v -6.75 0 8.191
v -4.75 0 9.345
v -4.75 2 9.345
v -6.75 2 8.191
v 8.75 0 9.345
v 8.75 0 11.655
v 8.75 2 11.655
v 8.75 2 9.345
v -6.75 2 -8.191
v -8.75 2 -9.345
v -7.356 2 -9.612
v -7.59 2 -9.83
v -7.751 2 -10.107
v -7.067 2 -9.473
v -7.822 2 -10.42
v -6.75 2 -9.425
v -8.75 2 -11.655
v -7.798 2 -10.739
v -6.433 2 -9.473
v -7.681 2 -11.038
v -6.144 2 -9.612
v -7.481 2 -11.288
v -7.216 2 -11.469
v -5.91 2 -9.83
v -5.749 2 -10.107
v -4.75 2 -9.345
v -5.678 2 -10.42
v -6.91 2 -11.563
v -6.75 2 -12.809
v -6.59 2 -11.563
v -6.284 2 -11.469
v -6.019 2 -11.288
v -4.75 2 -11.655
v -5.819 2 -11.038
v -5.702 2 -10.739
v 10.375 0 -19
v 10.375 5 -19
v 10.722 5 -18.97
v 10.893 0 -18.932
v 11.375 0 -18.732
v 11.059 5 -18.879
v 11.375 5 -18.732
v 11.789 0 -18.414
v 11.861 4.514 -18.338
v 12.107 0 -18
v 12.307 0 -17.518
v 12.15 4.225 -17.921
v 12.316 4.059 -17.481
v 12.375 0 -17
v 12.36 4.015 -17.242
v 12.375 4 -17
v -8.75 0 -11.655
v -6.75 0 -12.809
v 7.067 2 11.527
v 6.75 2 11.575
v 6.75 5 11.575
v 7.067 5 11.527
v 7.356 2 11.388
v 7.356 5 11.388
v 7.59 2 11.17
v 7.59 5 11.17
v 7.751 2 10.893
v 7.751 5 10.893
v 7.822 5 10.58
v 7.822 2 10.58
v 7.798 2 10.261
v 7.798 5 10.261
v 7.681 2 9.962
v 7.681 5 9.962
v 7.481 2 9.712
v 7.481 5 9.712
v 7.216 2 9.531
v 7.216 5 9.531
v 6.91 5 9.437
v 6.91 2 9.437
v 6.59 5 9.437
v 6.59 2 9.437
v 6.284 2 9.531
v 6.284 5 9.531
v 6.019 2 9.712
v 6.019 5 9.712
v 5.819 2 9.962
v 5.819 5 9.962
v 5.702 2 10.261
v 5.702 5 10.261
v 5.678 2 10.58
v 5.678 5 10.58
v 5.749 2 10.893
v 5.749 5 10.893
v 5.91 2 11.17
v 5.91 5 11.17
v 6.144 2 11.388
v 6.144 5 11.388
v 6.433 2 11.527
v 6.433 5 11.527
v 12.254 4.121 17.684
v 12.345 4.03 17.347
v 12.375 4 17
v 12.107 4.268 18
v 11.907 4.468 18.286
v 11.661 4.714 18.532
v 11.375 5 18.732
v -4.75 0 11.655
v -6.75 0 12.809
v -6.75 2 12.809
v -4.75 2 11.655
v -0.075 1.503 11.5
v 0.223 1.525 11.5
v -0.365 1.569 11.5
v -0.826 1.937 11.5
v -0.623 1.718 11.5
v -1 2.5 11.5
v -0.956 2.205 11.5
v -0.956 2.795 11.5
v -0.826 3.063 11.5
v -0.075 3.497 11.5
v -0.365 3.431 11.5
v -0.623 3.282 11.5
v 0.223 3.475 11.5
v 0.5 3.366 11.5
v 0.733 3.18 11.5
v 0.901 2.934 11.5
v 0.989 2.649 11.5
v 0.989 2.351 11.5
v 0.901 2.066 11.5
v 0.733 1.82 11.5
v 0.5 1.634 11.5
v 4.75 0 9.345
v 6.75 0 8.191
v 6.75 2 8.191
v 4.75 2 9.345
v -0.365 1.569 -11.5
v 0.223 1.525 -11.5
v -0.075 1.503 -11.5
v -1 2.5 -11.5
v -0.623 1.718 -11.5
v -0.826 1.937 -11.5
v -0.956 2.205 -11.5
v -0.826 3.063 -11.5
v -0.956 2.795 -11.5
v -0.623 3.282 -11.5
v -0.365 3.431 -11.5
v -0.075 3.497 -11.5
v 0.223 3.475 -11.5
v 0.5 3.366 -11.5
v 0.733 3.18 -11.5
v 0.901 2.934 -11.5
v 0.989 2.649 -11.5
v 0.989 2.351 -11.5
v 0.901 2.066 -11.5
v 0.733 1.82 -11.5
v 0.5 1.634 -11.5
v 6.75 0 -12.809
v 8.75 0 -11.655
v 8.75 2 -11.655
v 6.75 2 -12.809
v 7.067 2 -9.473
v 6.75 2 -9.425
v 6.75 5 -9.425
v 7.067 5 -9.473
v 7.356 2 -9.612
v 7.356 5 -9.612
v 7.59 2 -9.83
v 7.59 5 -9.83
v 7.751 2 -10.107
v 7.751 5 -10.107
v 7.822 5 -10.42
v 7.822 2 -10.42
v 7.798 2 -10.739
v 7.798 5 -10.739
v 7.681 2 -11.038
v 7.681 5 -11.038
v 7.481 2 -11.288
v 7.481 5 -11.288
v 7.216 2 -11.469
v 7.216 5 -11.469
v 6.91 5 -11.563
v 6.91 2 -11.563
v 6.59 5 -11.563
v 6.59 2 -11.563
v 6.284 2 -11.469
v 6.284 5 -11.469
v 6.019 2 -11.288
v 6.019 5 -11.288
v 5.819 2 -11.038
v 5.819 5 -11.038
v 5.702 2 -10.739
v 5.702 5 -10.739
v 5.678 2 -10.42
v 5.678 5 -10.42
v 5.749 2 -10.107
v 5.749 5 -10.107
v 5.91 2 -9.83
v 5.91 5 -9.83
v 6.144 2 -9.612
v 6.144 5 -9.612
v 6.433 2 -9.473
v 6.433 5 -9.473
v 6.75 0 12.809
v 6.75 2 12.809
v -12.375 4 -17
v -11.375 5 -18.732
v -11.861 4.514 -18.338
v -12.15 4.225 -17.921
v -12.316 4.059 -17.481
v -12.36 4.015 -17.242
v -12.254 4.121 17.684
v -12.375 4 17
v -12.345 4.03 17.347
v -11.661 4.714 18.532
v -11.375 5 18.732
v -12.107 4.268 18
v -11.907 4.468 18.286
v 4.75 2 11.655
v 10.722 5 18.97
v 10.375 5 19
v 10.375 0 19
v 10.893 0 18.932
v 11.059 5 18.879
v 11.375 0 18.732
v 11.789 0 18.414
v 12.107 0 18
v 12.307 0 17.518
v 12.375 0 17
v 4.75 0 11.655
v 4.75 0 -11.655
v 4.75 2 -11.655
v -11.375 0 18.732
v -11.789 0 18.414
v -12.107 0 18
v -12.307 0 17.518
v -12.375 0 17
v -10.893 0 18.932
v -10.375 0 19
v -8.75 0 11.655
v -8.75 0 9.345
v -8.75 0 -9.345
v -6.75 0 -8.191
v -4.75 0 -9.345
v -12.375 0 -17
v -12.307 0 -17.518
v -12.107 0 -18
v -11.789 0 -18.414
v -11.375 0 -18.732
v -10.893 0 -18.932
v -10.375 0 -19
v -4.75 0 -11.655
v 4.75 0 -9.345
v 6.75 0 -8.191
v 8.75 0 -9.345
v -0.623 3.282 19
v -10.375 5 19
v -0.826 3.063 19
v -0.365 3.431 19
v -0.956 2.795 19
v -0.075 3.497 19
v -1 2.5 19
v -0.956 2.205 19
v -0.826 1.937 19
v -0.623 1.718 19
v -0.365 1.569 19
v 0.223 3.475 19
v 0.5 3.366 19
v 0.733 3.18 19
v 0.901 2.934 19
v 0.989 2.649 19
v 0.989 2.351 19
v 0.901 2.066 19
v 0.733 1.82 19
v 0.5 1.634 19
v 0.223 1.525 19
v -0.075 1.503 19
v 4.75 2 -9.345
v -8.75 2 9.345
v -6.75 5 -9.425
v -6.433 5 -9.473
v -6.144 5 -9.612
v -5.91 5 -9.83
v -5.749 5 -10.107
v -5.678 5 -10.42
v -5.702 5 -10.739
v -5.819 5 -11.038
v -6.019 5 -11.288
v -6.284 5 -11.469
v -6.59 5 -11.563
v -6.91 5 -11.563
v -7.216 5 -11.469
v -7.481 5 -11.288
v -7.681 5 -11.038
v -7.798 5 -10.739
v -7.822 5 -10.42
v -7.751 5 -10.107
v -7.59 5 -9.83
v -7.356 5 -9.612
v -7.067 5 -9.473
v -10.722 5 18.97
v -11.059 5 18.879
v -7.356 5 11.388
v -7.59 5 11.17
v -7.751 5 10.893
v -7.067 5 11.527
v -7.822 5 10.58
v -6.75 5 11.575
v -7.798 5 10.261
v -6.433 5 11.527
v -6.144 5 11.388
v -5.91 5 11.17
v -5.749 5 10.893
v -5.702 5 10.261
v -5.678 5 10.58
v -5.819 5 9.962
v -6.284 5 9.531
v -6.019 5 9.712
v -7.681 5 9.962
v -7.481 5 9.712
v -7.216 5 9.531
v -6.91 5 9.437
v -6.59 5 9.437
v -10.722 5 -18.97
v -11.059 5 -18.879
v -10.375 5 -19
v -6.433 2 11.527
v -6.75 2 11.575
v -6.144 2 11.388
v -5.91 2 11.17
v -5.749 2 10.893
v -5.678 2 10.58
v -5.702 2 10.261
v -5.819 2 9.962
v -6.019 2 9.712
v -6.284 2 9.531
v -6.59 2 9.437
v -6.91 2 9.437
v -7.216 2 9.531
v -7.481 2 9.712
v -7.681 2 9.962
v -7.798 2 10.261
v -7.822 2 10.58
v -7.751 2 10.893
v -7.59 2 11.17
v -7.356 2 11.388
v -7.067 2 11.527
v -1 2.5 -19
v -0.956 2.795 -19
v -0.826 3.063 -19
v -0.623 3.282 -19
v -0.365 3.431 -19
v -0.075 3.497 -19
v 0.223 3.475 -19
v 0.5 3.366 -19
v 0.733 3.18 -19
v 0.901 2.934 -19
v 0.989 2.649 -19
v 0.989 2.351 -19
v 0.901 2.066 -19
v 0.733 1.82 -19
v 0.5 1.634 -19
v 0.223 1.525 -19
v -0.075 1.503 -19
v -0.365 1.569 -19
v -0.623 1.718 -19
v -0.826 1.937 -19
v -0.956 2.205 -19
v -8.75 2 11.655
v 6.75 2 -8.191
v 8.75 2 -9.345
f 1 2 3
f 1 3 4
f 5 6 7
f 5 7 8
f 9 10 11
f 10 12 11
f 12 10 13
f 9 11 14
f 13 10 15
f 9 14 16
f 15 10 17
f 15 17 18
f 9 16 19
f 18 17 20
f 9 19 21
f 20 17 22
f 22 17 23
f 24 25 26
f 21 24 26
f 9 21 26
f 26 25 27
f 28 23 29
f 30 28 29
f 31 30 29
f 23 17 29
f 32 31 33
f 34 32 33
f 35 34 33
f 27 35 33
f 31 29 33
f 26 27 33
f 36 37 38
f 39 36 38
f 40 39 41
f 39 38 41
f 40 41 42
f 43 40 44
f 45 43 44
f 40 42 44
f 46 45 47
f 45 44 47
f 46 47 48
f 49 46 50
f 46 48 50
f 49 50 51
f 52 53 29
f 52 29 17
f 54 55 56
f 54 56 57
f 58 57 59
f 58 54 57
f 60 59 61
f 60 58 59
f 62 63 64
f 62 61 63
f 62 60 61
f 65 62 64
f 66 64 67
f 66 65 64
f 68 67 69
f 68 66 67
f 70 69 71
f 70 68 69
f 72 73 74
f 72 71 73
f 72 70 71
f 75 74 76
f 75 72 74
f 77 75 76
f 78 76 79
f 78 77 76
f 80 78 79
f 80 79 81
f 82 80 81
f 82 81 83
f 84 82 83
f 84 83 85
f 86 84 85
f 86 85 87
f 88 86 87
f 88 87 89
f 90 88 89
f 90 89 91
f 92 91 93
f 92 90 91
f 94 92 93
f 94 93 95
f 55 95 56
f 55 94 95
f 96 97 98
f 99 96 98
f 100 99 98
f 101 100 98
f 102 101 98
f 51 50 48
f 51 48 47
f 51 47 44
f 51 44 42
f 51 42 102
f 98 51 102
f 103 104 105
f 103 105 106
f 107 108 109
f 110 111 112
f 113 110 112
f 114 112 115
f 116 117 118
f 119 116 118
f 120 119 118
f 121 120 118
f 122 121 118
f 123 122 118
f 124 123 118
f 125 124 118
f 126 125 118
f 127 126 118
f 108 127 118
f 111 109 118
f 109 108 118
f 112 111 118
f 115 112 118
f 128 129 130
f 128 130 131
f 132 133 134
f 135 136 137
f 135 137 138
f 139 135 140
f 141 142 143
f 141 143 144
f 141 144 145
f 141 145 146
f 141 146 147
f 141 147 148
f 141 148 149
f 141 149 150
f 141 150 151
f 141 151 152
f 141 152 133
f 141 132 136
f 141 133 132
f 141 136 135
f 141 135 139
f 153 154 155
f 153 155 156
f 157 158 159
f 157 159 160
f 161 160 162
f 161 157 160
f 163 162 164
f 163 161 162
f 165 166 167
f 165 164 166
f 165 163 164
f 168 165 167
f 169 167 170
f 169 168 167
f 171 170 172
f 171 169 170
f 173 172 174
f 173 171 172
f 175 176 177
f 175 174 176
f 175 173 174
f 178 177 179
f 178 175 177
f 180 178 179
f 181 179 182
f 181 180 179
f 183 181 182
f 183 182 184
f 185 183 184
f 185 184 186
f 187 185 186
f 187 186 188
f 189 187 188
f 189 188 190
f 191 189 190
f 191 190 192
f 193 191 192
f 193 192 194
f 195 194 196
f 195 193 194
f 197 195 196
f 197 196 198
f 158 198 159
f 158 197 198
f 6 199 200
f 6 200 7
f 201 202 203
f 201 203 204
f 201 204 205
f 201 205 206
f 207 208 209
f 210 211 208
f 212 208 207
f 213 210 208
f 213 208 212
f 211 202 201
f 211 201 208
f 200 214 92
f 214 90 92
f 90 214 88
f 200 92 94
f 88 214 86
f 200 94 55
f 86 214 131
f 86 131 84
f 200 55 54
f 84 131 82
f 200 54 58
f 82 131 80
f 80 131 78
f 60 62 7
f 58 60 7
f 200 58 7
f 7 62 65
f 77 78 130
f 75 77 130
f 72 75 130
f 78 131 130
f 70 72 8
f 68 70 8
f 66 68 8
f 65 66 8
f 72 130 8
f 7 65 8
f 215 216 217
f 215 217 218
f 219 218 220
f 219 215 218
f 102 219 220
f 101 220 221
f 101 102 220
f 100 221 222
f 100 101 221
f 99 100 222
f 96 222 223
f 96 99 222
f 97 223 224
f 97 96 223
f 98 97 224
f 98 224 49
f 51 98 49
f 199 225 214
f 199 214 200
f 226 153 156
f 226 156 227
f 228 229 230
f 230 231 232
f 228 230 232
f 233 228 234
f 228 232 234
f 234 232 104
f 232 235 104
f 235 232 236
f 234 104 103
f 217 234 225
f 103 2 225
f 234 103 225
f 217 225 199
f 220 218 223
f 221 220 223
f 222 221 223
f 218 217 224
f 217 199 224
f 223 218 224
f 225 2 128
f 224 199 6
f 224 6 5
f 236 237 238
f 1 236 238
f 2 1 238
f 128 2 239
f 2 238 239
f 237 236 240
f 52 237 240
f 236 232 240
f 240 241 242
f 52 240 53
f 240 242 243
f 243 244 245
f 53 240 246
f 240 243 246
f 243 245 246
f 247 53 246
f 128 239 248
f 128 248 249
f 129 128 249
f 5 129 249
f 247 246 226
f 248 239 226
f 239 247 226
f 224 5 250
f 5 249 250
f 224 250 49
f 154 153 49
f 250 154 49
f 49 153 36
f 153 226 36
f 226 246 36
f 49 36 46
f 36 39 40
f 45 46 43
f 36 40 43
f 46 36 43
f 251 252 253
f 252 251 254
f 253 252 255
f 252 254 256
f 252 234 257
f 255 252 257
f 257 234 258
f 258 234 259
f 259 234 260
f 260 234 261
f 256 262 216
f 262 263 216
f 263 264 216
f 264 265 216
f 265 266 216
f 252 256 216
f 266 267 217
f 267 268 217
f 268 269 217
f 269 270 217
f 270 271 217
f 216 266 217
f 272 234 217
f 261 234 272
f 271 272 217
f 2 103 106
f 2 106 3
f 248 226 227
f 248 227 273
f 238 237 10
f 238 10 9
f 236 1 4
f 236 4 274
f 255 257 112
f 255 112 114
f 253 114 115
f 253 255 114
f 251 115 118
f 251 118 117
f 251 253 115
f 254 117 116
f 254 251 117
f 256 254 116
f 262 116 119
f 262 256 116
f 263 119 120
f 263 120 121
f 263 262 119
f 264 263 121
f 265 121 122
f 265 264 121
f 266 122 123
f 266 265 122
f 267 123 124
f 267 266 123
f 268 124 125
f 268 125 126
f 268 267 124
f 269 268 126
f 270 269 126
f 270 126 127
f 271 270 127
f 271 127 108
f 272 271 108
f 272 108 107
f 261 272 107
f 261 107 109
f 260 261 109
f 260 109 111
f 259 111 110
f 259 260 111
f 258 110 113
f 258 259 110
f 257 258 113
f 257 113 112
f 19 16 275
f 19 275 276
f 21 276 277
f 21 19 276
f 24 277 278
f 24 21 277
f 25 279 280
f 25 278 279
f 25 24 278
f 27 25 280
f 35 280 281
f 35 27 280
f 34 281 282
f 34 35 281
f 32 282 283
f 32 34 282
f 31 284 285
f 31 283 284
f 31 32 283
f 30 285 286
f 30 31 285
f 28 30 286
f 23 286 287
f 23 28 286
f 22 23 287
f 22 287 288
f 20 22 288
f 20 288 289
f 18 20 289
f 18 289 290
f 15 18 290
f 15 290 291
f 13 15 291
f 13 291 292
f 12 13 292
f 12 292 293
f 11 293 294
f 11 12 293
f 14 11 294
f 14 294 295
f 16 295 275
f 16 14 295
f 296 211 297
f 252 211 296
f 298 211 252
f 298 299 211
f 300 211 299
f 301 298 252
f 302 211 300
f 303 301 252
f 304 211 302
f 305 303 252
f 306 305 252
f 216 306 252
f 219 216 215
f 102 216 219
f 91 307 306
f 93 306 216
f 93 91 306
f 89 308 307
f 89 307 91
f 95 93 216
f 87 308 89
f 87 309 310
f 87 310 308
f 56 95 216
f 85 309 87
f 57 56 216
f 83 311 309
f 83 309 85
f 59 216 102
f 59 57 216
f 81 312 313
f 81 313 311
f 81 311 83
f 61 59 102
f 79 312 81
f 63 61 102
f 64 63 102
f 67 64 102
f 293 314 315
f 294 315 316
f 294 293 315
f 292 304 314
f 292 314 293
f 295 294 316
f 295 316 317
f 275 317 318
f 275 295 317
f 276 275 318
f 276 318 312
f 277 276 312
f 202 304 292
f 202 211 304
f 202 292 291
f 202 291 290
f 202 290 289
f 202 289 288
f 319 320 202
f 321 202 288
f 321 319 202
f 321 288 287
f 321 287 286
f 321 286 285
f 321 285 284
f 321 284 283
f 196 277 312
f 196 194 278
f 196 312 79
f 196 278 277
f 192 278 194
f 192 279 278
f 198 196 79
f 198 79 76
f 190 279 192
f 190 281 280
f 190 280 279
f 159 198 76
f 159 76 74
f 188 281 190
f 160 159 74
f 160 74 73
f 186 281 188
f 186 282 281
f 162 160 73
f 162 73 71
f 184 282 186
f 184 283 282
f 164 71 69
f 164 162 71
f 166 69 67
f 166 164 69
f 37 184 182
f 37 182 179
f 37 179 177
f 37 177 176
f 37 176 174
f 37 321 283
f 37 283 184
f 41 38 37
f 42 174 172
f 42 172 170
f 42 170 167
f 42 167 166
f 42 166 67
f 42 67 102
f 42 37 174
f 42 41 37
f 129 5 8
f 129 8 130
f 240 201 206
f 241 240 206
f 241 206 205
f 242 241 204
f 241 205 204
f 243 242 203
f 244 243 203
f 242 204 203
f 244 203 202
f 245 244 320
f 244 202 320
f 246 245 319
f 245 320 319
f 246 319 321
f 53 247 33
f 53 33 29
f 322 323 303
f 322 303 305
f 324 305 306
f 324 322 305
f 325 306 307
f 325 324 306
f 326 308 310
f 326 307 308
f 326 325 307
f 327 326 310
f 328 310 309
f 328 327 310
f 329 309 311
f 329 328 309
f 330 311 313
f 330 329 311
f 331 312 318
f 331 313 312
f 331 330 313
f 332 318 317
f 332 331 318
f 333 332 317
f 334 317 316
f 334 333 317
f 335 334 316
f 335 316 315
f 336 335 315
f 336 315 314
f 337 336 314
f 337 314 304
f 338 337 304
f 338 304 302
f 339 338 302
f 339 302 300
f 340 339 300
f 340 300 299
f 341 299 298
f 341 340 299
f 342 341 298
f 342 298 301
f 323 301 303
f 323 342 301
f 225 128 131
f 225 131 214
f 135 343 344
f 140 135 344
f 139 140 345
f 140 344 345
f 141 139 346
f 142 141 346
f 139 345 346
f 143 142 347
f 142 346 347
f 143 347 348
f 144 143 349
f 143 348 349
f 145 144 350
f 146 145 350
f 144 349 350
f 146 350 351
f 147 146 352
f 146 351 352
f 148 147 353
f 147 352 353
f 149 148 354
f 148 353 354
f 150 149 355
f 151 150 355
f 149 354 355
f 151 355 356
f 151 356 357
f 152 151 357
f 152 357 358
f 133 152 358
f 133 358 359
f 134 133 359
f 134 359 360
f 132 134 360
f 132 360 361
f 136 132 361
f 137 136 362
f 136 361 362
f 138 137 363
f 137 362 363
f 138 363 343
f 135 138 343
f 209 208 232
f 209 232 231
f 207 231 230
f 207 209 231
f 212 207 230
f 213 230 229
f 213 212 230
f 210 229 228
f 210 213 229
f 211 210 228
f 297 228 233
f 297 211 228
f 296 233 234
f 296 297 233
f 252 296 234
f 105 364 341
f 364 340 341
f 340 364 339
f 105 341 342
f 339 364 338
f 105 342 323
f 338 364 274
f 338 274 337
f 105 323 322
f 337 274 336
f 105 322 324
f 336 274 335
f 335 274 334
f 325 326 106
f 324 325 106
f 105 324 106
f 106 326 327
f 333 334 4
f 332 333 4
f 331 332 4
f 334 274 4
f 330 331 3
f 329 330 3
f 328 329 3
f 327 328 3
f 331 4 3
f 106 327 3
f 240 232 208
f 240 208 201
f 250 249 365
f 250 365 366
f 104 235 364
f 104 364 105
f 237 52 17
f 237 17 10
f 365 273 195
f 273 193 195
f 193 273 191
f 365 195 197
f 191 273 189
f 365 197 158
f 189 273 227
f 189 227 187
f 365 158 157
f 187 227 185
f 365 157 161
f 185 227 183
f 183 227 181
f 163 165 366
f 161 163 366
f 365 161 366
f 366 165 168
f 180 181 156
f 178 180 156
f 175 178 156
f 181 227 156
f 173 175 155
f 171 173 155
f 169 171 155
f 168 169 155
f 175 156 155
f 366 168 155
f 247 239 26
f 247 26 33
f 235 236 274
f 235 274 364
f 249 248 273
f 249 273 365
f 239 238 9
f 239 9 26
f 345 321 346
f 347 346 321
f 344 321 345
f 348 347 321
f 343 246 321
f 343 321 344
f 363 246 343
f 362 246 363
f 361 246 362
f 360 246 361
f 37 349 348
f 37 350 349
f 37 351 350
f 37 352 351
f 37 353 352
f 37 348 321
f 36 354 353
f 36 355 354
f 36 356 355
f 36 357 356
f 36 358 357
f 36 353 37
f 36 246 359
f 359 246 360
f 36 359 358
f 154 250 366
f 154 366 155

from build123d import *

# Parameters (mm, degrees)
BASE_W              = 24.75
BASE_H              = 38
BASE_R              = 1.075
BOSS_EXTRUDE1_DEPTH = 5
SKETCH1_3_R         = 1.075
CUT_EXTRUDE1_DEPTH  = 2
SKETCH1_5_R         = 1.075
CUT_EXTRUDE2_DEPTH  = 24.219401909
FILLET1_R           = 2
CHAMFER1_SIZE       = 1
MOUNT_HOLE_R        = 1
CUT_EXTRUDE3_DEPTH  = 7.5


with BuildPart() as part:
    # Base → Boss-Extrude1 (new body)
    # profile 1 of 9: a face of its own
    with BuildSketch(Plane(origin=(0, 0, 0), x_dir=(1, 0, 0), z_dir=(0, 1, 0))):
        Rectangle(BASE_W, BASE_H)
        Polygon((-6.75, -12.809401077), (-4.75, -11.654700538), (-4.75, -9.345299462), (-6.75, -8.190598923), (-8.75, -9.345299462), (-8.75, -11.654700538), align=None, mode=Mode.SUBTRACT)
        Polygon((6.75, -12.809401077), (8.75, -11.654700538), (8.75, -9.345299462), (6.75, -8.190598923), (4.75, -9.345299462), (4.75, -11.654700538), align=None, mode=Mode.SUBTRACT)
        Polygon((8.75, 9.345299462), (8.75, 11.654700538), (6.75, 12.809401077), (4.75, 11.654700538), (4.75, 9.345299462), (6.75, 8.190598923), align=None, mode=Mode.SUBTRACT)
        Polygon((-6.75, 8.190598923), (-4.75, 9.345299462), (-4.75, 11.654700538), (-6.75, 12.809401077), (-8.75, 11.654700538), (-8.75, 9.345299462), align=None, mode=Mode.SUBTRACT)
    # profile 2 of 9: a face of its own
    with BuildSketch(Plane(origin=(0, 0, 0), x_dir=(1, 0, 0), z_dir=(0, 1, 0))):
        Polygon((4.75, -11.654700538), (6.75, -12.809401077), (8.75, -11.654700538), (8.75, -9.345299462), (6.75, -8.190598923), (4.75, -9.345299462), align=None)
        with Locations((6.75, -10.5)):
            Circle(BASE_R, mode=Mode.SUBTRACT)
    # profile 3 of 9: a face of its own
    with BuildSketch(Plane(origin=(0, 0, 0), x_dir=(1, 0, 0), z_dir=(0, 1, 0))):
        with Locations((6.75, -10.5)):
            Circle(BASE_R)
    # profile 4 of 9: a face of its own
    with BuildSketch(Plane(origin=(0, 0, 0), x_dir=(1, 0, 0), z_dir=(0, 1, 0))):
        Polygon((6.75, 8.190598923), (8.75, 9.345299462), (8.75, 11.654700538), (6.75, 12.809401077), (4.75, 11.654700538), (4.75, 9.345299462), align=None)
        with Locations((6.75, 10.5)):
            Circle(BASE_R, mode=Mode.SUBTRACT)
    # profile 5 of 9: a face of its own
    with BuildSketch(Plane(origin=(0, 0, 0), x_dir=(1, 0, 0), z_dir=(0, 1, 0))):
        Polygon((-8.75, 9.345299462), (-6.75, 8.190598923), (-4.75, 9.345299462), (-4.75, 11.654700538), (-6.75, 12.809401077), (-8.75, 11.654700538), align=None)
        with Locations((-6.75, 10.5)):
            Circle(BASE_R, mode=Mode.SUBTRACT)
    # profile 6 of 9: a face of its own
    with BuildSketch(Plane(origin=(0, 0, 0), x_dir=(1, 0, 0), z_dir=(0, 1, 0))):
        with Locations((-6.75, 10.5)):
            Circle(BASE_R)
    # profile 7 of 9: a face of its own
    with BuildSketch(Plane(origin=(0, 0, 0), x_dir=(1, 0, 0), z_dir=(0, 1, 0))):
        with Locations((6.75, 10.5)):
            Circle(BASE_R)
    # profile 8 of 9: a face of its own
    with BuildSketch(Plane(origin=(0, 0, 0), x_dir=(1, 0, 0), z_dir=(0, 1, 0))):
        Polygon((-8.75, -11.654700538), (-6.75, -12.809401077), (-4.75, -11.654700538), (-4.75, -9.345299462), (-6.75, -8.190598923), (-8.75, -9.345299462), align=None)
        with Locations((-6.75, -10.5)):
            Circle(BASE_R, mode=Mode.SUBTRACT)
    # profile 9 of 9: a face of its own
    with BuildSketch(Plane(origin=(0, 0, 0), x_dir=(1, 0, 0), z_dir=(0, 1, 0))):
        with Locations((-6.75, -10.5)):
            Circle(BASE_R)
    extrude(amount=BOSS_EXTRUDE1_DEPTH)

    # Sketch1<3> → Cut-Extrude1 (cut)
    # profile 1 of 8: a face of its own
    with BuildSketch(Plane(origin=(0, 0, 0), x_dir=(1, 0, 0), z_dir=(0, 1, 0))):
        Polygon((-8.75, 9.345299462), (-6.75, 8.190598923), (-4.75, 9.345299462), (-4.75, 11.654700538), (-6.75, 12.809401077), (-8.75, 11.654700538), align=None)
        with Locations((-6.75, 10.5)):
            Circle(SKETCH1_3_R, mode=Mode.SUBTRACT)
    # profile 2 of 8: a face of its own
    with BuildSketch(Plane(origin=(0, 0, 0), x_dir=(1, 0, 0), z_dir=(0, 1, 0))):
        with Locations((-6.75, 10.5)):
            Circle(SKETCH1_3_R)
    # profile 3 of 8: a face of its own
    with BuildSketch(Plane(origin=(0, 0, 0), x_dir=(1, 0, 0), z_dir=(0, 1, 0))):
        Polygon((-8.75, -11.654700538), (-6.75, -12.809401077), (-4.75, -11.654700538), (-4.75, -9.345299462), (-6.75, -8.190598923), (-8.75, -9.345299462), align=None)
        with Locations((-6.75, -10.5)):
            Circle(SKETCH1_3_R, mode=Mode.SUBTRACT)
    # profile 4 of 8: a face of its own
    with BuildSketch(Plane(origin=(0, 0, 0), x_dir=(1, 0, 0), z_dir=(0, 1, 0))):
        with Locations((-6.75, -10.5)):
            Circle(SKETCH1_3_R)
    # profile 5 of 8: a face of its own
    with BuildSketch(Plane(origin=(0, 0, 0), x_dir=(1, 0, 0), z_dir=(0, 1, 0))):
        Polygon((4.75, -11.654700538), (6.75, -12.809401077), (8.75, -11.654700538), (8.75, -9.345299462), (6.75, -8.190598923), (4.75, -9.345299462), align=None)
        with Locations((6.75, -10.5)):
            Circle(SKETCH1_3_R, mode=Mode.SUBTRACT)
    # profile 6 of 8: a face of its own
    with BuildSketch(Plane(origin=(0, 0, 0), x_dir=(1, 0, 0), z_dir=(0, 1, 0))):
        with Locations((6.75, -10.5)):
            Circle(SKETCH1_3_R)
    # profile 7 of 8: a face of its own
    with BuildSketch(Plane(origin=(0, 0, 0), x_dir=(1, 0, 0), z_dir=(0, 1, 0))):
        Polygon((6.75, 8.190598923), (8.75, 9.345299462), (8.75, 11.654700538), (6.75, 12.809401077), (4.75, 11.654700538), (4.75, 9.345299462), align=None)
        with Locations((6.75, 10.5)):
            Circle(SKETCH1_3_R, mode=Mode.SUBTRACT)
    # profile 8 of 8: a face of its own
    with BuildSketch(Plane(origin=(0, 0, 0), x_dir=(1, 0, 0), z_dir=(0, 1, 0))):
        with Locations((6.75, 10.5)):
            Circle(SKETCH1_3_R)
    extrude(amount=CUT_EXTRUDE1_DEPTH, mode=Mode.SUBTRACT)

    # Sketch1<5> → Cut-Extrude2 (cut, through all)
    with BuildSketch(Plane(origin=(0, 0, 0), x_dir=(1, 0, 0), z_dir=(0, 1, 0))):
        with Locations(Location((6.75, 10.5, 0), (0, 0, 270))):
            Circle(SKETCH1_5_R)
        with Locations(Location((6.75, -10.5, 0), (0, 0, 270))):
            Circle(SKETCH1_5_R)
        with Locations(Location((-6.75, -10.5, 0), (0, 0, 270))):
            Circle(SKETCH1_5_R)
        with Locations(Location((-6.75, 10.5, 0), (0, 0, 270))):
            Circle(SKETCH1_5_R)
    extrude(amount=CUT_EXTRUDE2_DEPTH, mode=Mode.SUBTRACT)

    # Fillet1
    fillet1_edges = [part.edges().sort_by_distance(p)[0] for p in [
        (12.375, 2.5, 19),
        (-12.375, 2.5, 19),
        (-12.375, 2.5, -19),
        (12.375, 2.5, -19),
    ]]
    fillet(fillet1_edges, radius=FILLET1_R)

    # Chamfer1
    # the kernel refuses this chamfer: 1 mm, written as the material it takes off along each edge
    with BuildSketch(Plane(origin=(12.375, 5, -19.571682988), x_dir=(0.027495876610585623, -0.9996219169112968, 0), z_dir=(0, 0, 1))) as chamfer1_piece_1:
        Polygon((CHAMFER1_SIZE * 0.999621916911, -CHAMFER1_SIZE * 0.0274958766106), (-CHAMFER1_SIZE * 0.0274958766106, -CHAMFER1_SIZE * 0.999621916911), (0, 0), align=None)
    extrude(amount=39.143365976, mode=Mode.SUBTRACT)
    with BuildSketch(Plane(origin=(-12.375, 5, 19.571682988), x_dir=(0.9996219169112968, 0.02749587661058651, 0), z_dir=(0, 0, -1))) as chamfer1_piece_2:
        Polygon((CHAMFER1_SIZE * 0.999621916911, CHAMFER1_SIZE * 0.0274958766106), (-CHAMFER1_SIZE * 0.0274958766106, CHAMFER1_SIZE * 0.999621916911), (0, 0), align=None)
    extrude(amount=39.143365976, mode=Mode.SUBTRACT)

    # Mount_Hole → Cut-Extrude3 (cut)
    with BuildSketch(Plane(origin=(0, 0, -19), x_dir=(-1, 0, 0), z_dir=(0, 0, -1))):
        with Locations((0, 2.5)):
            Circle(MOUNT_HOLE_R)
    cut_extrude3 = extrude(amount=-CUT_EXTRUDE3_DEPTH, mode=Mode.SUBTRACT)

    # Mirror1: Cut-Extrude3 across plane
    add(cut_extrude3.mirror(Plane(origin=(0, 0, 0), x_dir=(1, 0, 0), z_dir=(0, 0, -1))), mode=Mode.SUBTRACT)


solid = part.part
